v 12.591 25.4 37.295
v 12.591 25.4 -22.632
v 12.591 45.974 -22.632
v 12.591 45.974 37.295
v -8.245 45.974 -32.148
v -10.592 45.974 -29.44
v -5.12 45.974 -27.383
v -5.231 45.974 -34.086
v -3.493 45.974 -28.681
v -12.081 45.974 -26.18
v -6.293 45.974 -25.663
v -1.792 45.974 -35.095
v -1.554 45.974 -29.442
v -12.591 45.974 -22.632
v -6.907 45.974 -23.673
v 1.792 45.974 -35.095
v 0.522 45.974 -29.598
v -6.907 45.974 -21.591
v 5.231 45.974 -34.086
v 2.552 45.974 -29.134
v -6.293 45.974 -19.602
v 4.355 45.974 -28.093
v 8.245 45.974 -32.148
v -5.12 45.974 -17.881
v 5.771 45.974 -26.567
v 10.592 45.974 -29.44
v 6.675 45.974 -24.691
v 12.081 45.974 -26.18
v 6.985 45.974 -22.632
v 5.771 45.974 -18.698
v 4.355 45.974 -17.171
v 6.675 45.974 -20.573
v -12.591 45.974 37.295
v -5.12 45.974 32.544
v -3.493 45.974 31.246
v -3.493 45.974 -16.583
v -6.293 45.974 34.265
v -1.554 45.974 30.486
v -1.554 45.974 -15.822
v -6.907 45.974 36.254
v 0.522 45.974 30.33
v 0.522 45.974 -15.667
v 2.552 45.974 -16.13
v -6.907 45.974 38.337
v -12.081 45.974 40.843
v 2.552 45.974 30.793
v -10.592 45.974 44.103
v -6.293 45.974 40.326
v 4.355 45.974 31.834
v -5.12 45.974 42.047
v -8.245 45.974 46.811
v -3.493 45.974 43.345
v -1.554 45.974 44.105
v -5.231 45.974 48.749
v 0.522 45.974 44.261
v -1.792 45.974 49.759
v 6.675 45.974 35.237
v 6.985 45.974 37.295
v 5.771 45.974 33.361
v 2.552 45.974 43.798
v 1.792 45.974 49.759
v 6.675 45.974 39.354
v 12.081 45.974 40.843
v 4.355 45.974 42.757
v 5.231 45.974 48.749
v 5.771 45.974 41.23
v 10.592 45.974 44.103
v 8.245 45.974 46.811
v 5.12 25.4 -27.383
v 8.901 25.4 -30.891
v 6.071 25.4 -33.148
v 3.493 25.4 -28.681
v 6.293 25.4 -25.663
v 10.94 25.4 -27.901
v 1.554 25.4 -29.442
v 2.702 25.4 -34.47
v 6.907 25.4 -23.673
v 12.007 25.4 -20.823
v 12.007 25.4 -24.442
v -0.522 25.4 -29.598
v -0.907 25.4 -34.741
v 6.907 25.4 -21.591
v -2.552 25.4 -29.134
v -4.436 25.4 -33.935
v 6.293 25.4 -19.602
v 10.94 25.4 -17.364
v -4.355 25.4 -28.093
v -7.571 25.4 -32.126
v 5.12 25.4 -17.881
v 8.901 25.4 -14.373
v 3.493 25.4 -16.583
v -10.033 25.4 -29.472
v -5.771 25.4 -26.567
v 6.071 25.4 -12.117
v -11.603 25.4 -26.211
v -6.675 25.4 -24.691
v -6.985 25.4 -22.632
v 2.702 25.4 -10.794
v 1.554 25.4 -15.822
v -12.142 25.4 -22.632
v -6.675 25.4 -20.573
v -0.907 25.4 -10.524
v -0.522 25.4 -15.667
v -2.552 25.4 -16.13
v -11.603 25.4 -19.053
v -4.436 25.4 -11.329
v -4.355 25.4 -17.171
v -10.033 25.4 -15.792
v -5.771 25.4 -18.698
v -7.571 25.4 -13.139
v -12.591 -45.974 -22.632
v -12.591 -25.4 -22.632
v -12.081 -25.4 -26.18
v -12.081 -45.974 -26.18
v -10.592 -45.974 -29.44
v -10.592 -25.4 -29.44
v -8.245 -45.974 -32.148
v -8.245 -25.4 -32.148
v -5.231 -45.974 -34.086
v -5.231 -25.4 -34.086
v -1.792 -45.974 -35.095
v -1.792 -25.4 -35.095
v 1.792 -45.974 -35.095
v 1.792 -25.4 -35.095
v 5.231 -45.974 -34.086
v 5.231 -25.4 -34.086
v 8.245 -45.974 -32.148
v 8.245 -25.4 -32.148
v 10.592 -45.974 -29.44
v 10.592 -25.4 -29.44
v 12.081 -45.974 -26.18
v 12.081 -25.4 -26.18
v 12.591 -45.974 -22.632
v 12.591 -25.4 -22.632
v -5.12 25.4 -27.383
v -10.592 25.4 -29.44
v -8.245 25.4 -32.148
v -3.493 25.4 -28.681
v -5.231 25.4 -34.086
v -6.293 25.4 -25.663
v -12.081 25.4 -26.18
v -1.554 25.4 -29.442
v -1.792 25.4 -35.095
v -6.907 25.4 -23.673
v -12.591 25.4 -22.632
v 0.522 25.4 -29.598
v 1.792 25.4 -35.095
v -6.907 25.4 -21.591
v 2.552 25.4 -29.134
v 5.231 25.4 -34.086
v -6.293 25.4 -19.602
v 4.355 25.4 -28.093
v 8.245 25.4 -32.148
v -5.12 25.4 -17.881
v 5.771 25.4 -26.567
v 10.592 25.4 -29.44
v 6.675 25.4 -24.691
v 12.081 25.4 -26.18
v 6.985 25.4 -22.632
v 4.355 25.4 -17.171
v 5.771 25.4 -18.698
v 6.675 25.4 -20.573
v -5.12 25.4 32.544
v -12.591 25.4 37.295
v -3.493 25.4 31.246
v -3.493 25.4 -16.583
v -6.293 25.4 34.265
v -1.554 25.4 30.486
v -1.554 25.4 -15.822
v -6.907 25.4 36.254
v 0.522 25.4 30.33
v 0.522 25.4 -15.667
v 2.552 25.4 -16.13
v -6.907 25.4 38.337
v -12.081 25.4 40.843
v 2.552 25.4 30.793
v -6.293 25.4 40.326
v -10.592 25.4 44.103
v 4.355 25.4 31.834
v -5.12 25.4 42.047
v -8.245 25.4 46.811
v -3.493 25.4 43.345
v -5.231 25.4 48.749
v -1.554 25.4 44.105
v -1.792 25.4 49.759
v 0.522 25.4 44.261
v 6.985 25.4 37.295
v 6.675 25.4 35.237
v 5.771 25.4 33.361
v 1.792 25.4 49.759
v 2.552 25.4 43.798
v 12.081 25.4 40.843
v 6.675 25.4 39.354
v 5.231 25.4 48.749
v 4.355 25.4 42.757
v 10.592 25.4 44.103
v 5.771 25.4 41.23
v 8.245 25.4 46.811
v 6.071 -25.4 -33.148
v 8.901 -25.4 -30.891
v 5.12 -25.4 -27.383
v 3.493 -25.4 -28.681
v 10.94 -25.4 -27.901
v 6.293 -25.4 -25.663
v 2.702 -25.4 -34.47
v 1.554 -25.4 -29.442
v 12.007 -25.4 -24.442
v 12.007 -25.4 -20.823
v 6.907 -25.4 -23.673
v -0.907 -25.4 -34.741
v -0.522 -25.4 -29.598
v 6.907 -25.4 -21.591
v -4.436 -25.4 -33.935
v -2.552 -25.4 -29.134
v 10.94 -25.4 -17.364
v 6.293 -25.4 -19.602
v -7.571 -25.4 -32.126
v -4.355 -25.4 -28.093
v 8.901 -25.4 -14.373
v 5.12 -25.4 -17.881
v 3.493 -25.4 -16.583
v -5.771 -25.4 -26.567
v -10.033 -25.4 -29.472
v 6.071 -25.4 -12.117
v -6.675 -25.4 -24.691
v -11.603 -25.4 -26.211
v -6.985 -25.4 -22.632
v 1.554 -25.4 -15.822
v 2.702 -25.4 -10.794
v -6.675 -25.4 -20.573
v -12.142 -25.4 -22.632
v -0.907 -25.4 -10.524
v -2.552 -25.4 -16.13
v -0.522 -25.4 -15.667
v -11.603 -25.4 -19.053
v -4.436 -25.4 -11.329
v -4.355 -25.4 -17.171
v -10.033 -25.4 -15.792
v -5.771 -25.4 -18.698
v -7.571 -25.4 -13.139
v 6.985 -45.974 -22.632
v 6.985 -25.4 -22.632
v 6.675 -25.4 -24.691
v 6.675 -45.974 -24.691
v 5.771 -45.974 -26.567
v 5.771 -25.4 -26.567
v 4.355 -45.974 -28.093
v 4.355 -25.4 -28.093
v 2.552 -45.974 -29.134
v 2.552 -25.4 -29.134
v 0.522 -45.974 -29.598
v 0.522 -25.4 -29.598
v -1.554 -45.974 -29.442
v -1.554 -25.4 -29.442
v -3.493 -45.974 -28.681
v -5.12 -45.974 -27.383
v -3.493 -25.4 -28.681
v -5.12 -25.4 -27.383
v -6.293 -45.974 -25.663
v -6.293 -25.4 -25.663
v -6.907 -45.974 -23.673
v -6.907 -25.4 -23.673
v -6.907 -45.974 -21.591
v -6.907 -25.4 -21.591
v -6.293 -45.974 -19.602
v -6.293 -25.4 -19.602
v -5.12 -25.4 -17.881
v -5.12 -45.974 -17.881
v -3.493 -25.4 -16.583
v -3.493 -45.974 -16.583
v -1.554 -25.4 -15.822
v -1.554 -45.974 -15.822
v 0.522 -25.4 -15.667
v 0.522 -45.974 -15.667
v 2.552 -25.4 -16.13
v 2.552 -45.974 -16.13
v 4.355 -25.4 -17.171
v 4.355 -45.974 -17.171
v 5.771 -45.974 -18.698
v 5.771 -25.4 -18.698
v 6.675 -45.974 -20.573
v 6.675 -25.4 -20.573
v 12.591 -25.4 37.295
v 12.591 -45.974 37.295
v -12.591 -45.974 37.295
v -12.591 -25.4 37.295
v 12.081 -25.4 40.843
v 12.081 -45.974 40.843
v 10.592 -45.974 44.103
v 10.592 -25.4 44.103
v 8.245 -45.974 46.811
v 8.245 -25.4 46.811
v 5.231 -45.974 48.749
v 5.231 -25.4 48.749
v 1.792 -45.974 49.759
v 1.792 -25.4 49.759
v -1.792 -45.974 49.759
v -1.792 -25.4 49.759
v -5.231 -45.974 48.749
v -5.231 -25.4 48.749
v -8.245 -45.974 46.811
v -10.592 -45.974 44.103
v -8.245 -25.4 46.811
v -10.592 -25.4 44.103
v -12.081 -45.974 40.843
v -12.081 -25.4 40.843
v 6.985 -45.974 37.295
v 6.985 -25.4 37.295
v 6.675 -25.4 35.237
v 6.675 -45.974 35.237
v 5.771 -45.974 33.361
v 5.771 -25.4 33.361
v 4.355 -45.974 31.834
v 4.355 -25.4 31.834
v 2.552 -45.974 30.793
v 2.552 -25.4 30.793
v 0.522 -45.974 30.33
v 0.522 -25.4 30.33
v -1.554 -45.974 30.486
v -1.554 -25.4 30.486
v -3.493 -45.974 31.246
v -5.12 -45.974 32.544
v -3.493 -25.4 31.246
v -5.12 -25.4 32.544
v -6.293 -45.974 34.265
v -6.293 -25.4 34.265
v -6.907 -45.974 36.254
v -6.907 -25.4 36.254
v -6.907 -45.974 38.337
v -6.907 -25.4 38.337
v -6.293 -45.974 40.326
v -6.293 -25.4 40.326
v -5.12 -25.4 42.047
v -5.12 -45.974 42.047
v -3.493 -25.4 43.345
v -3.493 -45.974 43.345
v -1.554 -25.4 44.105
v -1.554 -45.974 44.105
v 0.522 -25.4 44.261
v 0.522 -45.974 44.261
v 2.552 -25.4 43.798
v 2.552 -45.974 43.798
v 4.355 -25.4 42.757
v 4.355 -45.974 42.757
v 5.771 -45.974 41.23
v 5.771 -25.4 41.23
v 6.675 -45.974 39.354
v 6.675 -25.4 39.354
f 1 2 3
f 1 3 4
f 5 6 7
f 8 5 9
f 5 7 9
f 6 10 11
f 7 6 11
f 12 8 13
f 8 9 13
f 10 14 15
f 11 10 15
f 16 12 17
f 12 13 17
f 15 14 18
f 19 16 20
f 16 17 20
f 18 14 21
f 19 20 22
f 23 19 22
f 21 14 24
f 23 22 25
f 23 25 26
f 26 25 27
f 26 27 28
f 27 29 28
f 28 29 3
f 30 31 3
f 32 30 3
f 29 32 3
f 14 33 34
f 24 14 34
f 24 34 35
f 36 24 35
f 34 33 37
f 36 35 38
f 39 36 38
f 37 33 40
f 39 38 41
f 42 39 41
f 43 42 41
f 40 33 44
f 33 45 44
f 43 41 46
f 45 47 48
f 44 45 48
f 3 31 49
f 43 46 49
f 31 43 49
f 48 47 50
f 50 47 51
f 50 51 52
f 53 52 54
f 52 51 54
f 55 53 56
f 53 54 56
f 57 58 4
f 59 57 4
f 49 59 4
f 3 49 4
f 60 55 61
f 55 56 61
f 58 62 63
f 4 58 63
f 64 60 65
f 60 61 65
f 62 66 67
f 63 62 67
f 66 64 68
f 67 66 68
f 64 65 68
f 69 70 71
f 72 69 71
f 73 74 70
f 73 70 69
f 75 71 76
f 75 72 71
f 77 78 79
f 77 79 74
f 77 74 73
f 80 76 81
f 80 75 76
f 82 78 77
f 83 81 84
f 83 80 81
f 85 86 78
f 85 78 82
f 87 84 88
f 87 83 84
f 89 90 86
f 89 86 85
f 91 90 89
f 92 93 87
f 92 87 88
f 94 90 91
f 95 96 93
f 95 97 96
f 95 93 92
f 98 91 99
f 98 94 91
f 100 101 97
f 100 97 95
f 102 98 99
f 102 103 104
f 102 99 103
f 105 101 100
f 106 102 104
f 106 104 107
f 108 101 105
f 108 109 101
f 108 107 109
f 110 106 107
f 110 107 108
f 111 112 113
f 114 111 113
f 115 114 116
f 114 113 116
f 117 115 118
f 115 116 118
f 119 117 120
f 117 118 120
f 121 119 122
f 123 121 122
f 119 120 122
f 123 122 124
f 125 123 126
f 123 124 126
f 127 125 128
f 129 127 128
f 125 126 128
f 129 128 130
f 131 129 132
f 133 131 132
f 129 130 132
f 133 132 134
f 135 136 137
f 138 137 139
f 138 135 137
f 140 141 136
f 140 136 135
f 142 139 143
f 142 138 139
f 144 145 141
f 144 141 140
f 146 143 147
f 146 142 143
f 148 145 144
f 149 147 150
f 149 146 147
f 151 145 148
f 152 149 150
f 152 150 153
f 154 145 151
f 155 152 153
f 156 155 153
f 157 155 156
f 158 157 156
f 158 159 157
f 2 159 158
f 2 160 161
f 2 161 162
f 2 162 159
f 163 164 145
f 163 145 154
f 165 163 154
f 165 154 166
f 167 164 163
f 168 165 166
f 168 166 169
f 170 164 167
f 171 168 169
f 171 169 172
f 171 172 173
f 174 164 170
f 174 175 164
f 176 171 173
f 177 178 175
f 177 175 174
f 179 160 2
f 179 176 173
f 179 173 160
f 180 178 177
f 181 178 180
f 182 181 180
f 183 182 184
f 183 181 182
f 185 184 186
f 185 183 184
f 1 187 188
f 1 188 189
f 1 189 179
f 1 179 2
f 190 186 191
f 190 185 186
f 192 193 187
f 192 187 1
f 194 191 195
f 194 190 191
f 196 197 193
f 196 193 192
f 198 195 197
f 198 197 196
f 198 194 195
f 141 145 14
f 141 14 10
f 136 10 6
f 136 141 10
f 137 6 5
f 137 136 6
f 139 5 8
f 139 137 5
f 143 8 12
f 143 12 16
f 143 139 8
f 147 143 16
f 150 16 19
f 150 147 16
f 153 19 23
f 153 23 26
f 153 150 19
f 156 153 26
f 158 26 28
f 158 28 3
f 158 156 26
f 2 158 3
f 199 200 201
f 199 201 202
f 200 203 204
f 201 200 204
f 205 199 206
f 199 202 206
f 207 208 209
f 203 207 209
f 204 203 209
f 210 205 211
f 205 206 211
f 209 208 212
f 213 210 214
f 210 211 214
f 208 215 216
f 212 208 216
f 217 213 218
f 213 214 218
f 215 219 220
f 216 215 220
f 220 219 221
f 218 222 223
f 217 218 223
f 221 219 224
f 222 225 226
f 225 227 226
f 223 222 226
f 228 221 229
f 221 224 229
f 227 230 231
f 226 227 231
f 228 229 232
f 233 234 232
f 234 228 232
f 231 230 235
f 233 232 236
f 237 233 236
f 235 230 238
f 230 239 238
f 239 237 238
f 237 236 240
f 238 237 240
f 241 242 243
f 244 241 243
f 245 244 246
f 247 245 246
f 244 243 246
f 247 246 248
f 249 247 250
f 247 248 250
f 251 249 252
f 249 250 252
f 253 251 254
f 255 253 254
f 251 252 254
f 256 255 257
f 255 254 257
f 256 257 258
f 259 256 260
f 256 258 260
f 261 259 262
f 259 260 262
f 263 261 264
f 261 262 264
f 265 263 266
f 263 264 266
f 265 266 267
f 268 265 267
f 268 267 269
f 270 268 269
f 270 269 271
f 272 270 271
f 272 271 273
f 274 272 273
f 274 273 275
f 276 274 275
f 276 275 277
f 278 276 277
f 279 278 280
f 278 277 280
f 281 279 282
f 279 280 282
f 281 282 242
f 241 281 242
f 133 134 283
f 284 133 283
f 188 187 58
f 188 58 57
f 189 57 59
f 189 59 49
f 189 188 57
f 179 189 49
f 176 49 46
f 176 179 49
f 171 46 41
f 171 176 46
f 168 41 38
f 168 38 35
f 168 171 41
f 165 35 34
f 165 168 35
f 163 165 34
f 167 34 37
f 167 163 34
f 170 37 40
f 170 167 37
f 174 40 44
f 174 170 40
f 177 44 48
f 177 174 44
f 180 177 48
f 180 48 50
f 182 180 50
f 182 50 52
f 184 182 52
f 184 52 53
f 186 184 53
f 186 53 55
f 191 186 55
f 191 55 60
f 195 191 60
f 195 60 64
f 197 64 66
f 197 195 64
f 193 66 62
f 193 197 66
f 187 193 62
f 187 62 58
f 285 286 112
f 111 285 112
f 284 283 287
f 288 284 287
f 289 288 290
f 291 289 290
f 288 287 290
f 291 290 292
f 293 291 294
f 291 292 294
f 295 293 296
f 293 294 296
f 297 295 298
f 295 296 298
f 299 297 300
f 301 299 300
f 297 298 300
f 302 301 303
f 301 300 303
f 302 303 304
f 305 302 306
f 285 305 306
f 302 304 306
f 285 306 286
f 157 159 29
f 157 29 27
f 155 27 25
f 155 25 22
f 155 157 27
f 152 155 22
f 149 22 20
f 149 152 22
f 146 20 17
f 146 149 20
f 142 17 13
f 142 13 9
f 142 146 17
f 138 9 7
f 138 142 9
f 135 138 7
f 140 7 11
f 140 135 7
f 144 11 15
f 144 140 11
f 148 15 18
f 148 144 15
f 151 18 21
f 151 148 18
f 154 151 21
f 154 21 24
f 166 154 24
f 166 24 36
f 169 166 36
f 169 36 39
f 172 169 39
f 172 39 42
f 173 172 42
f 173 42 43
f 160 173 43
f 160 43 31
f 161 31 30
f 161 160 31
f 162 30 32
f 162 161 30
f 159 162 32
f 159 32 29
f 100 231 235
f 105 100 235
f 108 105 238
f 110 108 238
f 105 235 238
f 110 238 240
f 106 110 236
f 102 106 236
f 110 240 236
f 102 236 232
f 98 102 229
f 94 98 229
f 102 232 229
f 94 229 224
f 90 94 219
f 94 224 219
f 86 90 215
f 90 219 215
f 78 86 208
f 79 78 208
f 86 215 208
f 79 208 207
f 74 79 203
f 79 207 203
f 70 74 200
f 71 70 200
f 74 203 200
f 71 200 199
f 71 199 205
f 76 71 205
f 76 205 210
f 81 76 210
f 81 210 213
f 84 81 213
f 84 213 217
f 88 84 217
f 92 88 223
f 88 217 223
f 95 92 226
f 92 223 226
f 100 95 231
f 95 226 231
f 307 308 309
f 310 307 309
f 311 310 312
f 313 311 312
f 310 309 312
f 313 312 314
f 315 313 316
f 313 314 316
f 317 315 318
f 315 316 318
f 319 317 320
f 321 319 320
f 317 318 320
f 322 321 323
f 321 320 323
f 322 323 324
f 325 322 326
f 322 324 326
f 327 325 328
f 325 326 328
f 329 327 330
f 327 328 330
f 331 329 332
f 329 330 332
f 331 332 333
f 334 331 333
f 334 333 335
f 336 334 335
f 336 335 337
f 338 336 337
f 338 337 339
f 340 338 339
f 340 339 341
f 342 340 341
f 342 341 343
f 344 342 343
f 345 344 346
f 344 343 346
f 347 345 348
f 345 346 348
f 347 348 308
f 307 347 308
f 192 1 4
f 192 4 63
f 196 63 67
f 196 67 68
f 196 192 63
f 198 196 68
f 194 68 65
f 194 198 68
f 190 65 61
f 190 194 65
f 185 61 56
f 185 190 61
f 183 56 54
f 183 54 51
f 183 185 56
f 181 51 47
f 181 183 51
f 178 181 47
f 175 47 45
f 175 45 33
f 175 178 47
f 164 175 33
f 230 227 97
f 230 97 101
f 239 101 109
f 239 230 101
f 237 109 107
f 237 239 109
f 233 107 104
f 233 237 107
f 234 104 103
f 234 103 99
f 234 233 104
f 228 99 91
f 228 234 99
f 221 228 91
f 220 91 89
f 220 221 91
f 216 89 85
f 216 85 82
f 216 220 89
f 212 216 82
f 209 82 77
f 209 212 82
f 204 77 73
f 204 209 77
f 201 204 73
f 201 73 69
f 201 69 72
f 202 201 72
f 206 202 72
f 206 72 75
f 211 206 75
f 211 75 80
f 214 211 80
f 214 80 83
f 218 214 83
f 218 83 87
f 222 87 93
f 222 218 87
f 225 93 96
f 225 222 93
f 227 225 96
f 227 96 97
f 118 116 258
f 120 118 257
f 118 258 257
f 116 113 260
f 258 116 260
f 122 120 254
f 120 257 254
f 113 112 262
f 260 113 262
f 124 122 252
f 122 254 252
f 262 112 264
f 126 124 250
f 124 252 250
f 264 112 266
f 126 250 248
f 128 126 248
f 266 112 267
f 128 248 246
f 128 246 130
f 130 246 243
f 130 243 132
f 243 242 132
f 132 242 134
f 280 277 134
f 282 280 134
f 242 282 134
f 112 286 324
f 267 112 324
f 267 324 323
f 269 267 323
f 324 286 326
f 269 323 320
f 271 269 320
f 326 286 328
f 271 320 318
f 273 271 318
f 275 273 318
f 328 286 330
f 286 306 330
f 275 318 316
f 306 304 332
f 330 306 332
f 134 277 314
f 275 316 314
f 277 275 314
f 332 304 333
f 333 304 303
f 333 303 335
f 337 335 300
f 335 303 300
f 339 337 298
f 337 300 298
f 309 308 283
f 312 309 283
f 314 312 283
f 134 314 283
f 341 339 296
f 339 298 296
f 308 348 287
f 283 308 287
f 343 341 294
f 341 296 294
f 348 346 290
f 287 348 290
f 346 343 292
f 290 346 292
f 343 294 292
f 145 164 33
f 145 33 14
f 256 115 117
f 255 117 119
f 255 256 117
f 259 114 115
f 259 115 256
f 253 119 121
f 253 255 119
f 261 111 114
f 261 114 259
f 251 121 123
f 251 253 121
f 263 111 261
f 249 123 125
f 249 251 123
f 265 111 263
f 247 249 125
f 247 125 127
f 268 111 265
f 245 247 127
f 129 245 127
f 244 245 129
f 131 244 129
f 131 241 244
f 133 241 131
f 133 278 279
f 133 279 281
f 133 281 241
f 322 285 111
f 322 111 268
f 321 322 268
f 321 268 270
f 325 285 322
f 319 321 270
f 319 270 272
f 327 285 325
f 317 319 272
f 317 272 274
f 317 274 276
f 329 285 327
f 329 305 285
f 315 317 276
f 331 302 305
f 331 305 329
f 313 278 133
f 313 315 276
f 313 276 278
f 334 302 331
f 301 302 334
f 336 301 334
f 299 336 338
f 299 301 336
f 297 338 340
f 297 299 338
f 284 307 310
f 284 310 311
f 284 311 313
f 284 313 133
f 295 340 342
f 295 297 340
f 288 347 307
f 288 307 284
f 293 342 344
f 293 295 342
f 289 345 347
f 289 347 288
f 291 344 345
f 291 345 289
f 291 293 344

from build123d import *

# Parameters (mm, degrees)
F2_DEPTH = 20.574
F4_R     = 12.142454
F4_R_2   = 6.985
F5_DEPTH = 50.8


with BuildPart() as f2:
    # F1 (on offset) → F2 (new body)
    with BuildSketch(Plane.XZ.offset(25.4)):
        with BuildLine():
            ThreePointArc((-6.985, 37.295498), (0, 44.280498), (6.985, 37.295498))
            Line((6.985, 37.295498), (12.591215, 37.295498))
            ThreePointArc((12.591215, 37.295498), (0, 49.886713), (-12.591215, 37.295498))
            Line((-12.591215, 37.295498), (-6.985, 37.295498))
        make_face()
        with BuildLine():
            Line((12.591215, 37.295498), (6.985, 37.295498))
            ThreePointArc((6.985, 37.295498), (0, 30.310498), (-6.985, 37.295498))
            Line((-6.985, 37.295498), (-12.591215, 37.295498))
            Line((-12.591215, 37.295498), (-12.591215, -22.632312))
            Line((-12.591215, -22.632312), (-6.985, -22.632312))
            ThreePointArc((-6.985, -22.632312), (0, -15.647312), (6.985, -22.632312))
            Line((6.985, -22.632312), (12.591215, -22.632312))
            Line((12.591215, -22.632312), (12.591215, 37.295498))
        make_face()
        with BuildLine():
            ThreePointArc((-12.591215, -22.632312), (0, -35.223527), (12.591215, -22.632312))
            Line((12.591215, -22.632312), (6.985, -22.632312))
            ThreePointArc((6.985, -22.632312), (0, -29.617312), (-6.985, -22.632312))
            Line((-6.985, -22.632312), (-12.591215, -22.632312))
        make_face()
    extrude(amount=F2_DEPTH)


with BuildPart() as f3_1:
    # F3: instance of F2
    add(f2.part.mirror(Plane.XZ))


with BuildPart() as f5:
    # F4 (on face) → F5 (new body, through all)
    with BuildSketch(Plane(origin=(0, -25.4, 0), x_dir=(-1, 0, 0), z_dir=(0, 1, 0))):
        with Locations((0, -22.632312)):
            Circle(F4_R)
        with Locations((0, -22.632312)):
            Circle(F4_R_2, mode=Mode.SUBTRACT)
    extrude(amount=F5_DEPTH)


solid = Compound([f2.part, f3_1.part, f5.part])
